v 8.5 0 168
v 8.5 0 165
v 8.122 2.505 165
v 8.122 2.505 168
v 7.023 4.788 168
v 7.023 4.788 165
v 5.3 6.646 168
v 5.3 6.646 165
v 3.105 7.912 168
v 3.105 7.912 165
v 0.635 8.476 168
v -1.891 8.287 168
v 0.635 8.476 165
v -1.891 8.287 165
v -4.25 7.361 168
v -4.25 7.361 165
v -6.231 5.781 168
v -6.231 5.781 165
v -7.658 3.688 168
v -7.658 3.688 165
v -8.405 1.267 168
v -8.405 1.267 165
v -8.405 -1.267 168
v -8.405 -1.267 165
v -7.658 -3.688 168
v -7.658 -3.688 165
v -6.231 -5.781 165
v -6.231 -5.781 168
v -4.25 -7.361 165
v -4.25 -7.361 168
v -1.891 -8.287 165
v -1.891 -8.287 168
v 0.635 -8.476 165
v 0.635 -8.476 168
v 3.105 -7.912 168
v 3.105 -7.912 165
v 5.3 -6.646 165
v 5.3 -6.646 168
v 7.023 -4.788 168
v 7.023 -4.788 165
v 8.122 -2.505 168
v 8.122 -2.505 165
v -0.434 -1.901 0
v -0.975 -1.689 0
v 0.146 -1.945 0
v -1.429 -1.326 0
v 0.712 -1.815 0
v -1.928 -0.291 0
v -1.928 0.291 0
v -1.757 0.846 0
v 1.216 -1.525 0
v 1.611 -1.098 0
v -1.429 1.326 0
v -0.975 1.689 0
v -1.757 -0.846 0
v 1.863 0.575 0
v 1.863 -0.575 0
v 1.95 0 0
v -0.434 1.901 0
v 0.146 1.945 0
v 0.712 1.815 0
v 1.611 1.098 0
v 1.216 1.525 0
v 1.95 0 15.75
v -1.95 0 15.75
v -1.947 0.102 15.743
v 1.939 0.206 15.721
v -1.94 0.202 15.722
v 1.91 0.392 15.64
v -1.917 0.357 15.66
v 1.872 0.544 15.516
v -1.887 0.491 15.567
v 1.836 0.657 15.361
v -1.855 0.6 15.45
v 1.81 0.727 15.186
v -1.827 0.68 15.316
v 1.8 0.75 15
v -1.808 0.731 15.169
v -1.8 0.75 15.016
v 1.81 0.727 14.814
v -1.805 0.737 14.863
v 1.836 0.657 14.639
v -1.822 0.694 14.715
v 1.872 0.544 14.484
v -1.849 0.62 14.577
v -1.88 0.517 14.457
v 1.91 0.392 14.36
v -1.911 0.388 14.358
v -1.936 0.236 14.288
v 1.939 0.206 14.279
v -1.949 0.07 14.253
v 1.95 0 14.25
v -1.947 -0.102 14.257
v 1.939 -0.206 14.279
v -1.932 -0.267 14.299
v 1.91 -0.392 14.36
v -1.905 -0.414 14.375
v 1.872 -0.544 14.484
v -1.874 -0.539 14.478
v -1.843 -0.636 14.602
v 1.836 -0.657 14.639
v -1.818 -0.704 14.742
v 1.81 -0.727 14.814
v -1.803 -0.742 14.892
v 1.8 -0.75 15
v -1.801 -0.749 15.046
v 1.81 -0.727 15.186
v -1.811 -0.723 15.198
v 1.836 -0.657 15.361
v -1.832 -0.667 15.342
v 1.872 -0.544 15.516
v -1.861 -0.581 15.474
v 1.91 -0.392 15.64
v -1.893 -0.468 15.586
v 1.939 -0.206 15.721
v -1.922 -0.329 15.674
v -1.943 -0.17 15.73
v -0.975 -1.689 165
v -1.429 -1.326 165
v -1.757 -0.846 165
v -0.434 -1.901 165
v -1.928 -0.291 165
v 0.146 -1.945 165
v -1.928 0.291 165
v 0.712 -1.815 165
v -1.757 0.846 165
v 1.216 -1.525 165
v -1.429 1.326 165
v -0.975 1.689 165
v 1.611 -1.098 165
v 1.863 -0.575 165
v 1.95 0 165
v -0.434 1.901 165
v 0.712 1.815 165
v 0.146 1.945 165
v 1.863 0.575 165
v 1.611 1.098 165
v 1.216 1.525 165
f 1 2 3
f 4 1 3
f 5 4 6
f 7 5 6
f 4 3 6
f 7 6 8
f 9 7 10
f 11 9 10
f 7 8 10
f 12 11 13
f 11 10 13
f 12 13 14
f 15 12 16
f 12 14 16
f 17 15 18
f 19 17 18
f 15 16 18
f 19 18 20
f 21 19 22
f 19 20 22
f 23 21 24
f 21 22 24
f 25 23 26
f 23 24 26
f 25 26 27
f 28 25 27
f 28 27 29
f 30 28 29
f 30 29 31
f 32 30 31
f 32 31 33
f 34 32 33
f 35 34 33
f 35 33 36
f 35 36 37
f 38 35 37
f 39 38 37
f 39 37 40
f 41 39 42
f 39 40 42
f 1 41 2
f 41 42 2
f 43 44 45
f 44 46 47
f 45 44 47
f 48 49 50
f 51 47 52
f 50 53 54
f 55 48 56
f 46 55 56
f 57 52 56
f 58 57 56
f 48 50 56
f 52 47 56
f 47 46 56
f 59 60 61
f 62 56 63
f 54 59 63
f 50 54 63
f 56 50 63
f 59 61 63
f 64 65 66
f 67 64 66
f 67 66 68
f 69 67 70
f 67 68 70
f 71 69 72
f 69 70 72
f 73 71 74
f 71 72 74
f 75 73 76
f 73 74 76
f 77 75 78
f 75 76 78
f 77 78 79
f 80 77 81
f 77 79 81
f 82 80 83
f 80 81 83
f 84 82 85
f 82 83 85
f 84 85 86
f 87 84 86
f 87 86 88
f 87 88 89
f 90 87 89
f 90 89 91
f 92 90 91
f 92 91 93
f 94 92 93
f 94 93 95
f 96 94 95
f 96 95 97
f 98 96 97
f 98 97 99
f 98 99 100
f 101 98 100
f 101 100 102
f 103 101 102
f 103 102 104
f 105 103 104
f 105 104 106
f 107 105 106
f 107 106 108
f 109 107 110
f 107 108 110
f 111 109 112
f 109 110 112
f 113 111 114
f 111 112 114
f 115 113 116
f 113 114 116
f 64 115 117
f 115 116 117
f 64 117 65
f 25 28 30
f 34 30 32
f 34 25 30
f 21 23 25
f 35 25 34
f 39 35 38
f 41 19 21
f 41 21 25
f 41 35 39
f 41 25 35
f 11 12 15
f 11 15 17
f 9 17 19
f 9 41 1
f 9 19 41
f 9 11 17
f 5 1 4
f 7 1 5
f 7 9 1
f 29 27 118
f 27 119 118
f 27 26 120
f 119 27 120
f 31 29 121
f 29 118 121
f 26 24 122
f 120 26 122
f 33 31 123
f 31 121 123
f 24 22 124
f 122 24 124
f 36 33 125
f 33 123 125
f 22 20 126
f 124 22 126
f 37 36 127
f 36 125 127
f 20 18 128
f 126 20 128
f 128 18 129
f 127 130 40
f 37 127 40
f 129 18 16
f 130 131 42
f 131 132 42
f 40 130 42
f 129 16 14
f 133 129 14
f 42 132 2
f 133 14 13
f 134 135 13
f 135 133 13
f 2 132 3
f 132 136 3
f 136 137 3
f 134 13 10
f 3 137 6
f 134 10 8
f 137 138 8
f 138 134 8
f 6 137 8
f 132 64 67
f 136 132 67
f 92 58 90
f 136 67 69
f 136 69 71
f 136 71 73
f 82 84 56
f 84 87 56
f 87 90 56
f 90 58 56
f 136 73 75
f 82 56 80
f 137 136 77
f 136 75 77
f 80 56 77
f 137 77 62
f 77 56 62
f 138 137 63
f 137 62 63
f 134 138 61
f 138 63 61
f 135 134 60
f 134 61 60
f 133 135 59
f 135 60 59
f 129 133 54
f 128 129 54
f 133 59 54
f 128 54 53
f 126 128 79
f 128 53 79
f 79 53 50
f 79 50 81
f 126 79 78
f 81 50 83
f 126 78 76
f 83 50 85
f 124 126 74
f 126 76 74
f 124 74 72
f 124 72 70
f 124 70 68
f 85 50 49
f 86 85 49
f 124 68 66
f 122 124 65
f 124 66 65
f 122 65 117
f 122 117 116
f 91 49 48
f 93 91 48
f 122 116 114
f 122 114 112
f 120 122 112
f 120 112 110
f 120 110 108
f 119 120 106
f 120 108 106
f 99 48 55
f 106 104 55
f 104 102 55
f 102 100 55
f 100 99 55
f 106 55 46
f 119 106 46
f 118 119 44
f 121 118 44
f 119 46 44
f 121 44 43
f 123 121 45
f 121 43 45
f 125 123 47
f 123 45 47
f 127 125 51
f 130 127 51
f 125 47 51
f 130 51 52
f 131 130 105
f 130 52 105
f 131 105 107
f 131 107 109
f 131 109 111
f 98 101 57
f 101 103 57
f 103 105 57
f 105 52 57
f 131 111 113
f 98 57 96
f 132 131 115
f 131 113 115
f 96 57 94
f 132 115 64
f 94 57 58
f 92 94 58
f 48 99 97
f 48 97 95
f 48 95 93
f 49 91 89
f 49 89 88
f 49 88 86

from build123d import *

# Parameters (mm, degrees)
SZKIC1_R                    = 1.95
DODANIE_WYCI_GNI_CIE1_DEPTH = 165
SZKIC2_R                    = 8.5
DODANIE_WYCI_GNI_CIE2_DEPTH = 3
SZKIC6_R                    = 0.75
WYTNIJ_WYCI_GNI_CIE2_DEPTH  = 11


with BuildPart() as part:
    # Szkic1 → Dodanie-wyciągnięcie1 (new body)
    with BuildSketch(Plane.XY):
        Circle(SZKIC1_R)
    extrude(amount=DODANIE_WYCI_GNI_CIE1_DEPTH)

    # Szkic2 → Dodanie-wyciągnięcie2 (add)
    with BuildSketch(Plane.XY.offset(165)):
        Circle(SZKIC2_R)
    extrude(amount=DODANIE_WYCI_GNI_CIE2_DEPTH)

    # Szkic6 → Wytnij-wyciągnięcie2 (cut)
    with BuildSketch(Plane.ZY.offset(1.95)):
        with Locations((15, 0)):
            Circle(SZKIC6_R)
    extrude(amount=-WYTNIJ_WYCI_GNI_CIE2_DEPTH, mode=Mode.SUBTRACT)


solid = part.part
